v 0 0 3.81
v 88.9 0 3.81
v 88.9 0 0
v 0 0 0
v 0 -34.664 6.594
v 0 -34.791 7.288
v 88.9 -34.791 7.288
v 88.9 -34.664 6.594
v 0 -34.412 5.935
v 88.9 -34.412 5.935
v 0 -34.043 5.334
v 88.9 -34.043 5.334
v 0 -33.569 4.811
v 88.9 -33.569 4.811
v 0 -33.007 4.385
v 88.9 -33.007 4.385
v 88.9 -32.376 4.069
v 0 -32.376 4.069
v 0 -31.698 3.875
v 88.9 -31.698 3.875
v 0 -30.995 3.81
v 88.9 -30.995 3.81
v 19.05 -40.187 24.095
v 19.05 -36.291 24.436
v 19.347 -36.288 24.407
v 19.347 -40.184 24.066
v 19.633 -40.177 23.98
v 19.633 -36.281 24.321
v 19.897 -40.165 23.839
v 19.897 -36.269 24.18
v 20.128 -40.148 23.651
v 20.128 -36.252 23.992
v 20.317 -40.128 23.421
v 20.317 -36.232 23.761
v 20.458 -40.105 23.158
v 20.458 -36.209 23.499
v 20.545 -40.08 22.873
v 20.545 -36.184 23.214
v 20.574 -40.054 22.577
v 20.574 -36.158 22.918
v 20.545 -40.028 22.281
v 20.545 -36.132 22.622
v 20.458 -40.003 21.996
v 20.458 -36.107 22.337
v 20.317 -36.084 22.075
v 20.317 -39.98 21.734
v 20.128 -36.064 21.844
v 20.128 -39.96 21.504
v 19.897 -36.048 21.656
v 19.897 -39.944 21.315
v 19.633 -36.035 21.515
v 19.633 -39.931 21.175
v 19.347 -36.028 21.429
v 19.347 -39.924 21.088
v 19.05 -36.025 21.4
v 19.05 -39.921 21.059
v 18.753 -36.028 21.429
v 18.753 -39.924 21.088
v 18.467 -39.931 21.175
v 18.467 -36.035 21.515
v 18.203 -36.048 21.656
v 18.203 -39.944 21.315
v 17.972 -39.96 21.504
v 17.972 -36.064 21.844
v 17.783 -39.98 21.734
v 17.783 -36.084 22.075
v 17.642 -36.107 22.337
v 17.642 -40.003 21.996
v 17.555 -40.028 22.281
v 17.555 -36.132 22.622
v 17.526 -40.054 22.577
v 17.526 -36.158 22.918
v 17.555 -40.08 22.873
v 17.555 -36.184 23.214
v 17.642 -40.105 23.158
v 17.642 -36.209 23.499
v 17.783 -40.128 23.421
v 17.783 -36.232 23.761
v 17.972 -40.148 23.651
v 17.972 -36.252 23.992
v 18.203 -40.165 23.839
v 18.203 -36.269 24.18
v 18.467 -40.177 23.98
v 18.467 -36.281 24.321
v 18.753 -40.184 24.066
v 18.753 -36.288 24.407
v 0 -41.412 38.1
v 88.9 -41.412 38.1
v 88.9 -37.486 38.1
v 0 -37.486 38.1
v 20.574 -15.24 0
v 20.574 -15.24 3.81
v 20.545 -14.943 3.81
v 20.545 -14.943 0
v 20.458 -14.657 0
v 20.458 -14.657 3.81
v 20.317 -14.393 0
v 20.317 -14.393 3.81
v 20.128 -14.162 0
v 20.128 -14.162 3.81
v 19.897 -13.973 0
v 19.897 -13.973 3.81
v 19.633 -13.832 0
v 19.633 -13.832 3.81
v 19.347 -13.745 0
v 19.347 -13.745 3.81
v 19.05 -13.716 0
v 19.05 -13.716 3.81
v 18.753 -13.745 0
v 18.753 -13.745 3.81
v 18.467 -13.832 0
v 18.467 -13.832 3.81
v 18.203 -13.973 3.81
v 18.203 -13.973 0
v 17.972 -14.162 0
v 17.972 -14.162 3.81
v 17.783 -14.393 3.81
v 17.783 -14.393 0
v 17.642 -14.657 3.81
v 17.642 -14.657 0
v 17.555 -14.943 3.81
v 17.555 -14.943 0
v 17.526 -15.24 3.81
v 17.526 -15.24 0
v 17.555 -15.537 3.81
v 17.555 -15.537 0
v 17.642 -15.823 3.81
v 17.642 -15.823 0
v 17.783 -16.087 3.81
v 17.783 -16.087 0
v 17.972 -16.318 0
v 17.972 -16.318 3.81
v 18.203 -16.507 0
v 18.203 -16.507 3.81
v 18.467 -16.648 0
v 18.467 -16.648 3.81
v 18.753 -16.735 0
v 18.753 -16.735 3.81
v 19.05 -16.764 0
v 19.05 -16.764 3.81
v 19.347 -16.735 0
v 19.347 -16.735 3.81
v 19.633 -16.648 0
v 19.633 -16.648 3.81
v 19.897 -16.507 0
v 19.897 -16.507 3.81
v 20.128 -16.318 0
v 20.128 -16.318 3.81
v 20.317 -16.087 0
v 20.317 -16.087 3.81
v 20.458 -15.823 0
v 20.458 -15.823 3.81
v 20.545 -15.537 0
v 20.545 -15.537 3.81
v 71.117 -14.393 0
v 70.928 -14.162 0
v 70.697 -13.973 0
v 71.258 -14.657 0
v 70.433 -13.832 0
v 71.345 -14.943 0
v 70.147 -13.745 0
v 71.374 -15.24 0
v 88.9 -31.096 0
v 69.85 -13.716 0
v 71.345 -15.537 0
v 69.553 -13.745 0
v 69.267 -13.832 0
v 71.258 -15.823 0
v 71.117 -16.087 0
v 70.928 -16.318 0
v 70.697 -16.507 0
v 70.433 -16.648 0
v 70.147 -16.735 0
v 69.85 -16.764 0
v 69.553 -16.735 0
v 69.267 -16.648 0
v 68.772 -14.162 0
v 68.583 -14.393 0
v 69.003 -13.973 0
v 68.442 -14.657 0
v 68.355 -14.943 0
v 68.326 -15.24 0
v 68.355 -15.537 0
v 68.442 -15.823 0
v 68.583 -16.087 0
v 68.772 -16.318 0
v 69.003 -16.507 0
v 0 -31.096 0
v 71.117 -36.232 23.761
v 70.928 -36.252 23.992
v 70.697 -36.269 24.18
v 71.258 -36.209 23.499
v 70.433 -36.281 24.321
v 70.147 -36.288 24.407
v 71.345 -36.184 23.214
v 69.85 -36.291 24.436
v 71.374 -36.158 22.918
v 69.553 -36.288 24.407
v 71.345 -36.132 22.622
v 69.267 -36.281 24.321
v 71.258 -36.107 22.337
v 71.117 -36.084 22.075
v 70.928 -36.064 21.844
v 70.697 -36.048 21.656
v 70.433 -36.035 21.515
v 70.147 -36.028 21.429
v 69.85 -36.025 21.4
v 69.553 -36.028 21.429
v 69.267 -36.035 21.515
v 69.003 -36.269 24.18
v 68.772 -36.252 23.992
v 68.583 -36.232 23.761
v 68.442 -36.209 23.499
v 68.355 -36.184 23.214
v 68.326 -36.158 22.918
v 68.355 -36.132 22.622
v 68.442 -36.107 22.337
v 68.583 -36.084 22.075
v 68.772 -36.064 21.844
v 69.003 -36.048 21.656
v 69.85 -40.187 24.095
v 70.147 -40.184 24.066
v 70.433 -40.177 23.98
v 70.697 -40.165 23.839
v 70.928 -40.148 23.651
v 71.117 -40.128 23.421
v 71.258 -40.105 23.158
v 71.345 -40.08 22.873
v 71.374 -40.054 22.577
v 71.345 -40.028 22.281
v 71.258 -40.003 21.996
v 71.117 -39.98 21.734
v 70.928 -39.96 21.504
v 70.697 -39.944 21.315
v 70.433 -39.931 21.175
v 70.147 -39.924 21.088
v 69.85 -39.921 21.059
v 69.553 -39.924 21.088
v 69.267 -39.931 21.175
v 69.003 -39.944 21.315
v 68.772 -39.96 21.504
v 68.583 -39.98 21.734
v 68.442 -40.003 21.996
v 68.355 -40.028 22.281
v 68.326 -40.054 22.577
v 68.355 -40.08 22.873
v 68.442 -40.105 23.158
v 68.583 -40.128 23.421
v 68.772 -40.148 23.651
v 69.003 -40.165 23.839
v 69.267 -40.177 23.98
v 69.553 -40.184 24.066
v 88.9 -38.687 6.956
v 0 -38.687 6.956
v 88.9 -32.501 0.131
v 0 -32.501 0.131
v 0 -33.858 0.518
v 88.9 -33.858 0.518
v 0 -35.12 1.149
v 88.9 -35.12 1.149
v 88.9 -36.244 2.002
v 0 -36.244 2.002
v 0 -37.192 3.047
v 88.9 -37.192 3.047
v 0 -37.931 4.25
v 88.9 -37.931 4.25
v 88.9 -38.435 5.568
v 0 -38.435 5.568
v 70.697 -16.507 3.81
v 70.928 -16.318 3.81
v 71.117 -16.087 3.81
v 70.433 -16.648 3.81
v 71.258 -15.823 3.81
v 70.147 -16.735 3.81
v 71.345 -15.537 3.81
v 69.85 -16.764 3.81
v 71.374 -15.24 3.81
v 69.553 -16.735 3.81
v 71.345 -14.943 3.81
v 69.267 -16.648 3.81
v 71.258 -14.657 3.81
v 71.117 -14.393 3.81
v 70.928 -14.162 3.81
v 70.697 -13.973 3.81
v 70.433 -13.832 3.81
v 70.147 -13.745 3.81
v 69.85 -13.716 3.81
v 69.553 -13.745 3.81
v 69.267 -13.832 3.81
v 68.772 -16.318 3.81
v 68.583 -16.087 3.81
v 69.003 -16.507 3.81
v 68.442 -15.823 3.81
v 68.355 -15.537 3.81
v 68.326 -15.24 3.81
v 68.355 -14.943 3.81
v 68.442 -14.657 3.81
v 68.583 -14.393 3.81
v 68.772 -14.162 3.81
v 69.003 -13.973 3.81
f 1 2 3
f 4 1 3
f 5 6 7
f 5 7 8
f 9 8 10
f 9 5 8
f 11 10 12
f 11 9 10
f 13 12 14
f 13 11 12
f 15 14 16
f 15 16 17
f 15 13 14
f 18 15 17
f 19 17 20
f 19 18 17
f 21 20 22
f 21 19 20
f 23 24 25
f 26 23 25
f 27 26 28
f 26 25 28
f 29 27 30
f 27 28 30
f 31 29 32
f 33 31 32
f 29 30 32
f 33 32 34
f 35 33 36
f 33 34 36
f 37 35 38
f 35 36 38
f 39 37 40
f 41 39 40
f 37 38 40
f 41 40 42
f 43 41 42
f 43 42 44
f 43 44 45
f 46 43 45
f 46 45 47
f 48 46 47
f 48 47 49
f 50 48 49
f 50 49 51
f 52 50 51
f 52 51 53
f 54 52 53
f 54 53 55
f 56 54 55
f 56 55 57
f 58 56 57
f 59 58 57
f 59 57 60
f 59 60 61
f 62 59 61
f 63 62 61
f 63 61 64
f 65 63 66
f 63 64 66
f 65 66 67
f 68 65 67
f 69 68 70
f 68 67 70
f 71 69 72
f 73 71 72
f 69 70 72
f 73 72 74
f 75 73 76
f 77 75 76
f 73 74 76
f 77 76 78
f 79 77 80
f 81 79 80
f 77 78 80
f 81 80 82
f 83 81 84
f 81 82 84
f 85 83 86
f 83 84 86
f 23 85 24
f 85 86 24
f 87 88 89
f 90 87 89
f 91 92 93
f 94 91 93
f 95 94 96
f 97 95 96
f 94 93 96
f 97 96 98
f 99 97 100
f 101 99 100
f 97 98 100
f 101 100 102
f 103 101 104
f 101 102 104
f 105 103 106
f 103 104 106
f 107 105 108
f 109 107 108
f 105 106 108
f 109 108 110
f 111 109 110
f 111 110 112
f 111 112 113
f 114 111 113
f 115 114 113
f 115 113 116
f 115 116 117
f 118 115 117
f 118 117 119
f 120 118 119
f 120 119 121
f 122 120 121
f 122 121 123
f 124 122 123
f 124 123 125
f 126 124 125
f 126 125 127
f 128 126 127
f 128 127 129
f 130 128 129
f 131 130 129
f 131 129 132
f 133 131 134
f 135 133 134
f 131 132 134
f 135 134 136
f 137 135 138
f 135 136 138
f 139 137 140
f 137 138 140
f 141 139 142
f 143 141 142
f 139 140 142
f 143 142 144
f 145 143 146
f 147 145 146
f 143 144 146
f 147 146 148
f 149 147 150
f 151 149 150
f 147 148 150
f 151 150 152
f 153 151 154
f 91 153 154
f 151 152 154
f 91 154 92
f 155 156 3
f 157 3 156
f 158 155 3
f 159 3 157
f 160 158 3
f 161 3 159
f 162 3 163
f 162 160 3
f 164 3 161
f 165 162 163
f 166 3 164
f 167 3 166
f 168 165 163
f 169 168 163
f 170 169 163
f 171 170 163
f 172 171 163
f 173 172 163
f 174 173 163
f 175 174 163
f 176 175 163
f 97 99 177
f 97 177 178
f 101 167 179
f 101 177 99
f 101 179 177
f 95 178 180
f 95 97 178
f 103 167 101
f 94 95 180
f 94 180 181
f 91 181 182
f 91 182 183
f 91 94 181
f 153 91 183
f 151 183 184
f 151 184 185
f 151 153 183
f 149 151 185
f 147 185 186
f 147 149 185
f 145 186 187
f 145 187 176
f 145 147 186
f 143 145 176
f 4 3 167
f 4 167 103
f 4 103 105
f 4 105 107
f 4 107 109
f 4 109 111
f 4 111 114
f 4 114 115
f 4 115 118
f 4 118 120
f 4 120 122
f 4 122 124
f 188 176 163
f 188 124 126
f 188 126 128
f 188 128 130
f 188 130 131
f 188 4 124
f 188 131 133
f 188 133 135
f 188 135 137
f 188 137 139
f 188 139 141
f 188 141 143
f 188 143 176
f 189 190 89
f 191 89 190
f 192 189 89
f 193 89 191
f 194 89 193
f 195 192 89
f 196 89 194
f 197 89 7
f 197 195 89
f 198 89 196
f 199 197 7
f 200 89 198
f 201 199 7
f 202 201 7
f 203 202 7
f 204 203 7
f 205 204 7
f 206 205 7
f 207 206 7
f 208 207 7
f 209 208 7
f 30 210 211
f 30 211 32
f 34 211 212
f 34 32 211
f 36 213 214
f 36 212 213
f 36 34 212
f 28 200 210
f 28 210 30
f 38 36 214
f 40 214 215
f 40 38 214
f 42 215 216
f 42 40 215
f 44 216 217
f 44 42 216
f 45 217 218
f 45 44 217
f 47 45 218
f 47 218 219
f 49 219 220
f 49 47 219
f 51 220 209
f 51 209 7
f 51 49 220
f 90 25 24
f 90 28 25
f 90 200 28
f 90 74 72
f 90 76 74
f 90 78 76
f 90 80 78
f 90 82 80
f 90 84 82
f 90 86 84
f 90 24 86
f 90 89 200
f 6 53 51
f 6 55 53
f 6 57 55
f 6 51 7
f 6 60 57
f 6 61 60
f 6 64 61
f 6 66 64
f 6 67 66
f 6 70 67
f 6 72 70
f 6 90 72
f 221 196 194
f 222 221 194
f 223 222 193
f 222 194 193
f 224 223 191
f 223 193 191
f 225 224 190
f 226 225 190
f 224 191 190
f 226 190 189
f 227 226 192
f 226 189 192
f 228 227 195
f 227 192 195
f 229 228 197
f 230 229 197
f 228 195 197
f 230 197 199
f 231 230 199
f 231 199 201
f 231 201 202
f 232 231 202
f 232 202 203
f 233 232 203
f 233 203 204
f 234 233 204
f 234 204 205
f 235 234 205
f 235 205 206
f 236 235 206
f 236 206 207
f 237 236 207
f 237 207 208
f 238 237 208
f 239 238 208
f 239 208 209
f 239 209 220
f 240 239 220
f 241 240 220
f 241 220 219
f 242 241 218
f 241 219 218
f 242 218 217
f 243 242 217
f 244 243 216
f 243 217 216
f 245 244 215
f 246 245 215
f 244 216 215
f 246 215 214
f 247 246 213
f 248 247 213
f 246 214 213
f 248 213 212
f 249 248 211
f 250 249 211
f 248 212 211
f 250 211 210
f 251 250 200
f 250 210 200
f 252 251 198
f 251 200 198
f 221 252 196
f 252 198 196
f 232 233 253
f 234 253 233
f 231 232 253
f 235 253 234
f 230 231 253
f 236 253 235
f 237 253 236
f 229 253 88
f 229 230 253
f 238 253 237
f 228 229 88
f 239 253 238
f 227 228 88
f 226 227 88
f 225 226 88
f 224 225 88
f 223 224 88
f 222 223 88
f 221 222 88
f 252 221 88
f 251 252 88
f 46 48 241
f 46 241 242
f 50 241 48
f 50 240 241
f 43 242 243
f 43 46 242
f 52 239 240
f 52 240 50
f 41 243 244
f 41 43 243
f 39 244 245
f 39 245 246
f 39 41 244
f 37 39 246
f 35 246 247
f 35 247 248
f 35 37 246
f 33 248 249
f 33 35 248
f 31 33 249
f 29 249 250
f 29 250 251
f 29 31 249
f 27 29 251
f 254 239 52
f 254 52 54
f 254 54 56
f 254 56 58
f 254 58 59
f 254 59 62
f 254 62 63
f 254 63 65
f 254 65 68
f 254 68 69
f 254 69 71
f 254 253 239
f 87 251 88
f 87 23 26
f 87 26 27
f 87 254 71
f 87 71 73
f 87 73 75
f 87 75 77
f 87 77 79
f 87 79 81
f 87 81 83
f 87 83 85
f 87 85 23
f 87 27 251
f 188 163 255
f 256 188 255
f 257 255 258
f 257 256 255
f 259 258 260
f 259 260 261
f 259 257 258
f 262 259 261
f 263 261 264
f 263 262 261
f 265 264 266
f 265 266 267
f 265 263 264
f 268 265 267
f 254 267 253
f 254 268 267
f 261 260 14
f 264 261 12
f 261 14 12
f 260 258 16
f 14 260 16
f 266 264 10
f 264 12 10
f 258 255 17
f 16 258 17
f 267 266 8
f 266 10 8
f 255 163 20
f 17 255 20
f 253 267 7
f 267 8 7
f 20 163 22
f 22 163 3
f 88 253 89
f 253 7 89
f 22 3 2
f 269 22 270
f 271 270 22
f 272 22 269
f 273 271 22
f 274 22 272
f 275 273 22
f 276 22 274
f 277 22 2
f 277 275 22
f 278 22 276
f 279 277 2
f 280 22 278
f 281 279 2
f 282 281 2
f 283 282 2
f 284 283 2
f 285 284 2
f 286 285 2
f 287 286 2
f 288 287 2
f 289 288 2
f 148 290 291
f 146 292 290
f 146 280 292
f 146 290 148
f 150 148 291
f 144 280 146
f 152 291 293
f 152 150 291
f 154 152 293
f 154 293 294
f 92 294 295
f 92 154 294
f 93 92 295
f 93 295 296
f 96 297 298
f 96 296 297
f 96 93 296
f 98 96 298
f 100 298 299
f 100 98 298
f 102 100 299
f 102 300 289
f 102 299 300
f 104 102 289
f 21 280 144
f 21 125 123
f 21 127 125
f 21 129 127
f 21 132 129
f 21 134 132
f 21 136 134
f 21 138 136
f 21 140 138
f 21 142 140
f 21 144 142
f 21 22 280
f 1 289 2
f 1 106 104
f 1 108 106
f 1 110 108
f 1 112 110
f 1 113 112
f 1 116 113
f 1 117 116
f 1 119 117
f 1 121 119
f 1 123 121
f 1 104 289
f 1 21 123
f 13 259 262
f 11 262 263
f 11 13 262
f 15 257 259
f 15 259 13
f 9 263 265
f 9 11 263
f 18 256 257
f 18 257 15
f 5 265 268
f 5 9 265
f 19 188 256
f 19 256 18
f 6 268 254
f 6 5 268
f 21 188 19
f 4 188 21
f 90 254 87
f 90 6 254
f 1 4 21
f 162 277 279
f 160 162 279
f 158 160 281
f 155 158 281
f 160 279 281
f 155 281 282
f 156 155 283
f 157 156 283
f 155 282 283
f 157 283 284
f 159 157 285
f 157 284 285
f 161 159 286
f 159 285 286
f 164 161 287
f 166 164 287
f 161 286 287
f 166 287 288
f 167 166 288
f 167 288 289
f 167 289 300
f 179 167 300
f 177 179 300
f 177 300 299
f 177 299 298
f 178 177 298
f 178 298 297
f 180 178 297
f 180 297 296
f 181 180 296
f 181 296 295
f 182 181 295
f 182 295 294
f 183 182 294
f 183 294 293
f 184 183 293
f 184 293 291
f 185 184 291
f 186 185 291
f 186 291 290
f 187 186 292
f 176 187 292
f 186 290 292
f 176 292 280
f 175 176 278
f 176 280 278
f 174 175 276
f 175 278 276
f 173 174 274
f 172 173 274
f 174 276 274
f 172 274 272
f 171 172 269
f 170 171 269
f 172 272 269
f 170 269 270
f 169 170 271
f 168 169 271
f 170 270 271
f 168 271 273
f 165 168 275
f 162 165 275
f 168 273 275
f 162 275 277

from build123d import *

# Parameters (mm, degrees)
BOSS_EXTRUDE1_DEPTH = 88.9
SKETCH13_R          = 1.524
CUT_EXTRUDE1_DEPTH  = 88.9
SKETCH12_R          = 1.524
CUT_EXTRUDE2_DEPTH  = 88.9


with BuildPart() as part:
    # Sketch11 → Boss-Extrude1 (new body)
    with BuildSketch(Plane(origin=(0, 0, 0), x_dir=(0, 0, -1), z_dir=(1, 0, 0))):
        with BuildLine():
            Line((0, 0), (0, -31.09642636))
            ThreePointArc((0, -31.09642636), (-2.001946694, -36.244423742), (-6.95587324, -38.68742996))
            Line((-6.95587324, -38.68742996), (-38.1, -41.412187987))
            Line((-38.1, -41.412187987), (-38.1, -37.486427648))
            Line((-38.1, -37.486427648), (-7.28793662, -34.790721402))
            ThreePointArc((-7.28793662, -34.790721402), (-4.810973347, -33.569218294), (-3.81, -30.995219603))
            Line((-3.81, -30.995219603), (-3.81, 0))
            Line((-3.81, 0), (0, 0))
        make_face()
    extrude(amount=BOSS_EXTRUDE1_DEPTH)

    # Sketch13 → Cut-Extrude1 (cut)
    with BuildSketch(Plane.XY.offset(3.81)):
        with Locations((69.85, -15.24)):
            Circle(SKETCH13_R)
        with Locations((19.05, -15.24)):
            Circle(SKETCH13_R)
    extrude(amount=-CUT_EXTRUDE1_DEPTH, mode=Mode.SUBTRACT)

    # Sketch12 → Cut-Extrude2 (cut)
    with BuildSketch(Plane(origin=(0, -33.89367833, -2.965312619), x_dir=(1, 0, 0), z_dir=(0, 0.9961946980917459, 0.08715574274765452))):
        with Locations(Location((69.85, -25.982175442, 0), (0, 0, 270))):
            Circle(SKETCH12_R)
        with Locations(Location((19.05, -25.982175442, 0), (0, 0, 270))):
            Circle(SKETCH12_R)
    extrude(amount=-CUT_EXTRUDE2_DEPTH, mode=Mode.SUBTRACT)


solid = part.part
